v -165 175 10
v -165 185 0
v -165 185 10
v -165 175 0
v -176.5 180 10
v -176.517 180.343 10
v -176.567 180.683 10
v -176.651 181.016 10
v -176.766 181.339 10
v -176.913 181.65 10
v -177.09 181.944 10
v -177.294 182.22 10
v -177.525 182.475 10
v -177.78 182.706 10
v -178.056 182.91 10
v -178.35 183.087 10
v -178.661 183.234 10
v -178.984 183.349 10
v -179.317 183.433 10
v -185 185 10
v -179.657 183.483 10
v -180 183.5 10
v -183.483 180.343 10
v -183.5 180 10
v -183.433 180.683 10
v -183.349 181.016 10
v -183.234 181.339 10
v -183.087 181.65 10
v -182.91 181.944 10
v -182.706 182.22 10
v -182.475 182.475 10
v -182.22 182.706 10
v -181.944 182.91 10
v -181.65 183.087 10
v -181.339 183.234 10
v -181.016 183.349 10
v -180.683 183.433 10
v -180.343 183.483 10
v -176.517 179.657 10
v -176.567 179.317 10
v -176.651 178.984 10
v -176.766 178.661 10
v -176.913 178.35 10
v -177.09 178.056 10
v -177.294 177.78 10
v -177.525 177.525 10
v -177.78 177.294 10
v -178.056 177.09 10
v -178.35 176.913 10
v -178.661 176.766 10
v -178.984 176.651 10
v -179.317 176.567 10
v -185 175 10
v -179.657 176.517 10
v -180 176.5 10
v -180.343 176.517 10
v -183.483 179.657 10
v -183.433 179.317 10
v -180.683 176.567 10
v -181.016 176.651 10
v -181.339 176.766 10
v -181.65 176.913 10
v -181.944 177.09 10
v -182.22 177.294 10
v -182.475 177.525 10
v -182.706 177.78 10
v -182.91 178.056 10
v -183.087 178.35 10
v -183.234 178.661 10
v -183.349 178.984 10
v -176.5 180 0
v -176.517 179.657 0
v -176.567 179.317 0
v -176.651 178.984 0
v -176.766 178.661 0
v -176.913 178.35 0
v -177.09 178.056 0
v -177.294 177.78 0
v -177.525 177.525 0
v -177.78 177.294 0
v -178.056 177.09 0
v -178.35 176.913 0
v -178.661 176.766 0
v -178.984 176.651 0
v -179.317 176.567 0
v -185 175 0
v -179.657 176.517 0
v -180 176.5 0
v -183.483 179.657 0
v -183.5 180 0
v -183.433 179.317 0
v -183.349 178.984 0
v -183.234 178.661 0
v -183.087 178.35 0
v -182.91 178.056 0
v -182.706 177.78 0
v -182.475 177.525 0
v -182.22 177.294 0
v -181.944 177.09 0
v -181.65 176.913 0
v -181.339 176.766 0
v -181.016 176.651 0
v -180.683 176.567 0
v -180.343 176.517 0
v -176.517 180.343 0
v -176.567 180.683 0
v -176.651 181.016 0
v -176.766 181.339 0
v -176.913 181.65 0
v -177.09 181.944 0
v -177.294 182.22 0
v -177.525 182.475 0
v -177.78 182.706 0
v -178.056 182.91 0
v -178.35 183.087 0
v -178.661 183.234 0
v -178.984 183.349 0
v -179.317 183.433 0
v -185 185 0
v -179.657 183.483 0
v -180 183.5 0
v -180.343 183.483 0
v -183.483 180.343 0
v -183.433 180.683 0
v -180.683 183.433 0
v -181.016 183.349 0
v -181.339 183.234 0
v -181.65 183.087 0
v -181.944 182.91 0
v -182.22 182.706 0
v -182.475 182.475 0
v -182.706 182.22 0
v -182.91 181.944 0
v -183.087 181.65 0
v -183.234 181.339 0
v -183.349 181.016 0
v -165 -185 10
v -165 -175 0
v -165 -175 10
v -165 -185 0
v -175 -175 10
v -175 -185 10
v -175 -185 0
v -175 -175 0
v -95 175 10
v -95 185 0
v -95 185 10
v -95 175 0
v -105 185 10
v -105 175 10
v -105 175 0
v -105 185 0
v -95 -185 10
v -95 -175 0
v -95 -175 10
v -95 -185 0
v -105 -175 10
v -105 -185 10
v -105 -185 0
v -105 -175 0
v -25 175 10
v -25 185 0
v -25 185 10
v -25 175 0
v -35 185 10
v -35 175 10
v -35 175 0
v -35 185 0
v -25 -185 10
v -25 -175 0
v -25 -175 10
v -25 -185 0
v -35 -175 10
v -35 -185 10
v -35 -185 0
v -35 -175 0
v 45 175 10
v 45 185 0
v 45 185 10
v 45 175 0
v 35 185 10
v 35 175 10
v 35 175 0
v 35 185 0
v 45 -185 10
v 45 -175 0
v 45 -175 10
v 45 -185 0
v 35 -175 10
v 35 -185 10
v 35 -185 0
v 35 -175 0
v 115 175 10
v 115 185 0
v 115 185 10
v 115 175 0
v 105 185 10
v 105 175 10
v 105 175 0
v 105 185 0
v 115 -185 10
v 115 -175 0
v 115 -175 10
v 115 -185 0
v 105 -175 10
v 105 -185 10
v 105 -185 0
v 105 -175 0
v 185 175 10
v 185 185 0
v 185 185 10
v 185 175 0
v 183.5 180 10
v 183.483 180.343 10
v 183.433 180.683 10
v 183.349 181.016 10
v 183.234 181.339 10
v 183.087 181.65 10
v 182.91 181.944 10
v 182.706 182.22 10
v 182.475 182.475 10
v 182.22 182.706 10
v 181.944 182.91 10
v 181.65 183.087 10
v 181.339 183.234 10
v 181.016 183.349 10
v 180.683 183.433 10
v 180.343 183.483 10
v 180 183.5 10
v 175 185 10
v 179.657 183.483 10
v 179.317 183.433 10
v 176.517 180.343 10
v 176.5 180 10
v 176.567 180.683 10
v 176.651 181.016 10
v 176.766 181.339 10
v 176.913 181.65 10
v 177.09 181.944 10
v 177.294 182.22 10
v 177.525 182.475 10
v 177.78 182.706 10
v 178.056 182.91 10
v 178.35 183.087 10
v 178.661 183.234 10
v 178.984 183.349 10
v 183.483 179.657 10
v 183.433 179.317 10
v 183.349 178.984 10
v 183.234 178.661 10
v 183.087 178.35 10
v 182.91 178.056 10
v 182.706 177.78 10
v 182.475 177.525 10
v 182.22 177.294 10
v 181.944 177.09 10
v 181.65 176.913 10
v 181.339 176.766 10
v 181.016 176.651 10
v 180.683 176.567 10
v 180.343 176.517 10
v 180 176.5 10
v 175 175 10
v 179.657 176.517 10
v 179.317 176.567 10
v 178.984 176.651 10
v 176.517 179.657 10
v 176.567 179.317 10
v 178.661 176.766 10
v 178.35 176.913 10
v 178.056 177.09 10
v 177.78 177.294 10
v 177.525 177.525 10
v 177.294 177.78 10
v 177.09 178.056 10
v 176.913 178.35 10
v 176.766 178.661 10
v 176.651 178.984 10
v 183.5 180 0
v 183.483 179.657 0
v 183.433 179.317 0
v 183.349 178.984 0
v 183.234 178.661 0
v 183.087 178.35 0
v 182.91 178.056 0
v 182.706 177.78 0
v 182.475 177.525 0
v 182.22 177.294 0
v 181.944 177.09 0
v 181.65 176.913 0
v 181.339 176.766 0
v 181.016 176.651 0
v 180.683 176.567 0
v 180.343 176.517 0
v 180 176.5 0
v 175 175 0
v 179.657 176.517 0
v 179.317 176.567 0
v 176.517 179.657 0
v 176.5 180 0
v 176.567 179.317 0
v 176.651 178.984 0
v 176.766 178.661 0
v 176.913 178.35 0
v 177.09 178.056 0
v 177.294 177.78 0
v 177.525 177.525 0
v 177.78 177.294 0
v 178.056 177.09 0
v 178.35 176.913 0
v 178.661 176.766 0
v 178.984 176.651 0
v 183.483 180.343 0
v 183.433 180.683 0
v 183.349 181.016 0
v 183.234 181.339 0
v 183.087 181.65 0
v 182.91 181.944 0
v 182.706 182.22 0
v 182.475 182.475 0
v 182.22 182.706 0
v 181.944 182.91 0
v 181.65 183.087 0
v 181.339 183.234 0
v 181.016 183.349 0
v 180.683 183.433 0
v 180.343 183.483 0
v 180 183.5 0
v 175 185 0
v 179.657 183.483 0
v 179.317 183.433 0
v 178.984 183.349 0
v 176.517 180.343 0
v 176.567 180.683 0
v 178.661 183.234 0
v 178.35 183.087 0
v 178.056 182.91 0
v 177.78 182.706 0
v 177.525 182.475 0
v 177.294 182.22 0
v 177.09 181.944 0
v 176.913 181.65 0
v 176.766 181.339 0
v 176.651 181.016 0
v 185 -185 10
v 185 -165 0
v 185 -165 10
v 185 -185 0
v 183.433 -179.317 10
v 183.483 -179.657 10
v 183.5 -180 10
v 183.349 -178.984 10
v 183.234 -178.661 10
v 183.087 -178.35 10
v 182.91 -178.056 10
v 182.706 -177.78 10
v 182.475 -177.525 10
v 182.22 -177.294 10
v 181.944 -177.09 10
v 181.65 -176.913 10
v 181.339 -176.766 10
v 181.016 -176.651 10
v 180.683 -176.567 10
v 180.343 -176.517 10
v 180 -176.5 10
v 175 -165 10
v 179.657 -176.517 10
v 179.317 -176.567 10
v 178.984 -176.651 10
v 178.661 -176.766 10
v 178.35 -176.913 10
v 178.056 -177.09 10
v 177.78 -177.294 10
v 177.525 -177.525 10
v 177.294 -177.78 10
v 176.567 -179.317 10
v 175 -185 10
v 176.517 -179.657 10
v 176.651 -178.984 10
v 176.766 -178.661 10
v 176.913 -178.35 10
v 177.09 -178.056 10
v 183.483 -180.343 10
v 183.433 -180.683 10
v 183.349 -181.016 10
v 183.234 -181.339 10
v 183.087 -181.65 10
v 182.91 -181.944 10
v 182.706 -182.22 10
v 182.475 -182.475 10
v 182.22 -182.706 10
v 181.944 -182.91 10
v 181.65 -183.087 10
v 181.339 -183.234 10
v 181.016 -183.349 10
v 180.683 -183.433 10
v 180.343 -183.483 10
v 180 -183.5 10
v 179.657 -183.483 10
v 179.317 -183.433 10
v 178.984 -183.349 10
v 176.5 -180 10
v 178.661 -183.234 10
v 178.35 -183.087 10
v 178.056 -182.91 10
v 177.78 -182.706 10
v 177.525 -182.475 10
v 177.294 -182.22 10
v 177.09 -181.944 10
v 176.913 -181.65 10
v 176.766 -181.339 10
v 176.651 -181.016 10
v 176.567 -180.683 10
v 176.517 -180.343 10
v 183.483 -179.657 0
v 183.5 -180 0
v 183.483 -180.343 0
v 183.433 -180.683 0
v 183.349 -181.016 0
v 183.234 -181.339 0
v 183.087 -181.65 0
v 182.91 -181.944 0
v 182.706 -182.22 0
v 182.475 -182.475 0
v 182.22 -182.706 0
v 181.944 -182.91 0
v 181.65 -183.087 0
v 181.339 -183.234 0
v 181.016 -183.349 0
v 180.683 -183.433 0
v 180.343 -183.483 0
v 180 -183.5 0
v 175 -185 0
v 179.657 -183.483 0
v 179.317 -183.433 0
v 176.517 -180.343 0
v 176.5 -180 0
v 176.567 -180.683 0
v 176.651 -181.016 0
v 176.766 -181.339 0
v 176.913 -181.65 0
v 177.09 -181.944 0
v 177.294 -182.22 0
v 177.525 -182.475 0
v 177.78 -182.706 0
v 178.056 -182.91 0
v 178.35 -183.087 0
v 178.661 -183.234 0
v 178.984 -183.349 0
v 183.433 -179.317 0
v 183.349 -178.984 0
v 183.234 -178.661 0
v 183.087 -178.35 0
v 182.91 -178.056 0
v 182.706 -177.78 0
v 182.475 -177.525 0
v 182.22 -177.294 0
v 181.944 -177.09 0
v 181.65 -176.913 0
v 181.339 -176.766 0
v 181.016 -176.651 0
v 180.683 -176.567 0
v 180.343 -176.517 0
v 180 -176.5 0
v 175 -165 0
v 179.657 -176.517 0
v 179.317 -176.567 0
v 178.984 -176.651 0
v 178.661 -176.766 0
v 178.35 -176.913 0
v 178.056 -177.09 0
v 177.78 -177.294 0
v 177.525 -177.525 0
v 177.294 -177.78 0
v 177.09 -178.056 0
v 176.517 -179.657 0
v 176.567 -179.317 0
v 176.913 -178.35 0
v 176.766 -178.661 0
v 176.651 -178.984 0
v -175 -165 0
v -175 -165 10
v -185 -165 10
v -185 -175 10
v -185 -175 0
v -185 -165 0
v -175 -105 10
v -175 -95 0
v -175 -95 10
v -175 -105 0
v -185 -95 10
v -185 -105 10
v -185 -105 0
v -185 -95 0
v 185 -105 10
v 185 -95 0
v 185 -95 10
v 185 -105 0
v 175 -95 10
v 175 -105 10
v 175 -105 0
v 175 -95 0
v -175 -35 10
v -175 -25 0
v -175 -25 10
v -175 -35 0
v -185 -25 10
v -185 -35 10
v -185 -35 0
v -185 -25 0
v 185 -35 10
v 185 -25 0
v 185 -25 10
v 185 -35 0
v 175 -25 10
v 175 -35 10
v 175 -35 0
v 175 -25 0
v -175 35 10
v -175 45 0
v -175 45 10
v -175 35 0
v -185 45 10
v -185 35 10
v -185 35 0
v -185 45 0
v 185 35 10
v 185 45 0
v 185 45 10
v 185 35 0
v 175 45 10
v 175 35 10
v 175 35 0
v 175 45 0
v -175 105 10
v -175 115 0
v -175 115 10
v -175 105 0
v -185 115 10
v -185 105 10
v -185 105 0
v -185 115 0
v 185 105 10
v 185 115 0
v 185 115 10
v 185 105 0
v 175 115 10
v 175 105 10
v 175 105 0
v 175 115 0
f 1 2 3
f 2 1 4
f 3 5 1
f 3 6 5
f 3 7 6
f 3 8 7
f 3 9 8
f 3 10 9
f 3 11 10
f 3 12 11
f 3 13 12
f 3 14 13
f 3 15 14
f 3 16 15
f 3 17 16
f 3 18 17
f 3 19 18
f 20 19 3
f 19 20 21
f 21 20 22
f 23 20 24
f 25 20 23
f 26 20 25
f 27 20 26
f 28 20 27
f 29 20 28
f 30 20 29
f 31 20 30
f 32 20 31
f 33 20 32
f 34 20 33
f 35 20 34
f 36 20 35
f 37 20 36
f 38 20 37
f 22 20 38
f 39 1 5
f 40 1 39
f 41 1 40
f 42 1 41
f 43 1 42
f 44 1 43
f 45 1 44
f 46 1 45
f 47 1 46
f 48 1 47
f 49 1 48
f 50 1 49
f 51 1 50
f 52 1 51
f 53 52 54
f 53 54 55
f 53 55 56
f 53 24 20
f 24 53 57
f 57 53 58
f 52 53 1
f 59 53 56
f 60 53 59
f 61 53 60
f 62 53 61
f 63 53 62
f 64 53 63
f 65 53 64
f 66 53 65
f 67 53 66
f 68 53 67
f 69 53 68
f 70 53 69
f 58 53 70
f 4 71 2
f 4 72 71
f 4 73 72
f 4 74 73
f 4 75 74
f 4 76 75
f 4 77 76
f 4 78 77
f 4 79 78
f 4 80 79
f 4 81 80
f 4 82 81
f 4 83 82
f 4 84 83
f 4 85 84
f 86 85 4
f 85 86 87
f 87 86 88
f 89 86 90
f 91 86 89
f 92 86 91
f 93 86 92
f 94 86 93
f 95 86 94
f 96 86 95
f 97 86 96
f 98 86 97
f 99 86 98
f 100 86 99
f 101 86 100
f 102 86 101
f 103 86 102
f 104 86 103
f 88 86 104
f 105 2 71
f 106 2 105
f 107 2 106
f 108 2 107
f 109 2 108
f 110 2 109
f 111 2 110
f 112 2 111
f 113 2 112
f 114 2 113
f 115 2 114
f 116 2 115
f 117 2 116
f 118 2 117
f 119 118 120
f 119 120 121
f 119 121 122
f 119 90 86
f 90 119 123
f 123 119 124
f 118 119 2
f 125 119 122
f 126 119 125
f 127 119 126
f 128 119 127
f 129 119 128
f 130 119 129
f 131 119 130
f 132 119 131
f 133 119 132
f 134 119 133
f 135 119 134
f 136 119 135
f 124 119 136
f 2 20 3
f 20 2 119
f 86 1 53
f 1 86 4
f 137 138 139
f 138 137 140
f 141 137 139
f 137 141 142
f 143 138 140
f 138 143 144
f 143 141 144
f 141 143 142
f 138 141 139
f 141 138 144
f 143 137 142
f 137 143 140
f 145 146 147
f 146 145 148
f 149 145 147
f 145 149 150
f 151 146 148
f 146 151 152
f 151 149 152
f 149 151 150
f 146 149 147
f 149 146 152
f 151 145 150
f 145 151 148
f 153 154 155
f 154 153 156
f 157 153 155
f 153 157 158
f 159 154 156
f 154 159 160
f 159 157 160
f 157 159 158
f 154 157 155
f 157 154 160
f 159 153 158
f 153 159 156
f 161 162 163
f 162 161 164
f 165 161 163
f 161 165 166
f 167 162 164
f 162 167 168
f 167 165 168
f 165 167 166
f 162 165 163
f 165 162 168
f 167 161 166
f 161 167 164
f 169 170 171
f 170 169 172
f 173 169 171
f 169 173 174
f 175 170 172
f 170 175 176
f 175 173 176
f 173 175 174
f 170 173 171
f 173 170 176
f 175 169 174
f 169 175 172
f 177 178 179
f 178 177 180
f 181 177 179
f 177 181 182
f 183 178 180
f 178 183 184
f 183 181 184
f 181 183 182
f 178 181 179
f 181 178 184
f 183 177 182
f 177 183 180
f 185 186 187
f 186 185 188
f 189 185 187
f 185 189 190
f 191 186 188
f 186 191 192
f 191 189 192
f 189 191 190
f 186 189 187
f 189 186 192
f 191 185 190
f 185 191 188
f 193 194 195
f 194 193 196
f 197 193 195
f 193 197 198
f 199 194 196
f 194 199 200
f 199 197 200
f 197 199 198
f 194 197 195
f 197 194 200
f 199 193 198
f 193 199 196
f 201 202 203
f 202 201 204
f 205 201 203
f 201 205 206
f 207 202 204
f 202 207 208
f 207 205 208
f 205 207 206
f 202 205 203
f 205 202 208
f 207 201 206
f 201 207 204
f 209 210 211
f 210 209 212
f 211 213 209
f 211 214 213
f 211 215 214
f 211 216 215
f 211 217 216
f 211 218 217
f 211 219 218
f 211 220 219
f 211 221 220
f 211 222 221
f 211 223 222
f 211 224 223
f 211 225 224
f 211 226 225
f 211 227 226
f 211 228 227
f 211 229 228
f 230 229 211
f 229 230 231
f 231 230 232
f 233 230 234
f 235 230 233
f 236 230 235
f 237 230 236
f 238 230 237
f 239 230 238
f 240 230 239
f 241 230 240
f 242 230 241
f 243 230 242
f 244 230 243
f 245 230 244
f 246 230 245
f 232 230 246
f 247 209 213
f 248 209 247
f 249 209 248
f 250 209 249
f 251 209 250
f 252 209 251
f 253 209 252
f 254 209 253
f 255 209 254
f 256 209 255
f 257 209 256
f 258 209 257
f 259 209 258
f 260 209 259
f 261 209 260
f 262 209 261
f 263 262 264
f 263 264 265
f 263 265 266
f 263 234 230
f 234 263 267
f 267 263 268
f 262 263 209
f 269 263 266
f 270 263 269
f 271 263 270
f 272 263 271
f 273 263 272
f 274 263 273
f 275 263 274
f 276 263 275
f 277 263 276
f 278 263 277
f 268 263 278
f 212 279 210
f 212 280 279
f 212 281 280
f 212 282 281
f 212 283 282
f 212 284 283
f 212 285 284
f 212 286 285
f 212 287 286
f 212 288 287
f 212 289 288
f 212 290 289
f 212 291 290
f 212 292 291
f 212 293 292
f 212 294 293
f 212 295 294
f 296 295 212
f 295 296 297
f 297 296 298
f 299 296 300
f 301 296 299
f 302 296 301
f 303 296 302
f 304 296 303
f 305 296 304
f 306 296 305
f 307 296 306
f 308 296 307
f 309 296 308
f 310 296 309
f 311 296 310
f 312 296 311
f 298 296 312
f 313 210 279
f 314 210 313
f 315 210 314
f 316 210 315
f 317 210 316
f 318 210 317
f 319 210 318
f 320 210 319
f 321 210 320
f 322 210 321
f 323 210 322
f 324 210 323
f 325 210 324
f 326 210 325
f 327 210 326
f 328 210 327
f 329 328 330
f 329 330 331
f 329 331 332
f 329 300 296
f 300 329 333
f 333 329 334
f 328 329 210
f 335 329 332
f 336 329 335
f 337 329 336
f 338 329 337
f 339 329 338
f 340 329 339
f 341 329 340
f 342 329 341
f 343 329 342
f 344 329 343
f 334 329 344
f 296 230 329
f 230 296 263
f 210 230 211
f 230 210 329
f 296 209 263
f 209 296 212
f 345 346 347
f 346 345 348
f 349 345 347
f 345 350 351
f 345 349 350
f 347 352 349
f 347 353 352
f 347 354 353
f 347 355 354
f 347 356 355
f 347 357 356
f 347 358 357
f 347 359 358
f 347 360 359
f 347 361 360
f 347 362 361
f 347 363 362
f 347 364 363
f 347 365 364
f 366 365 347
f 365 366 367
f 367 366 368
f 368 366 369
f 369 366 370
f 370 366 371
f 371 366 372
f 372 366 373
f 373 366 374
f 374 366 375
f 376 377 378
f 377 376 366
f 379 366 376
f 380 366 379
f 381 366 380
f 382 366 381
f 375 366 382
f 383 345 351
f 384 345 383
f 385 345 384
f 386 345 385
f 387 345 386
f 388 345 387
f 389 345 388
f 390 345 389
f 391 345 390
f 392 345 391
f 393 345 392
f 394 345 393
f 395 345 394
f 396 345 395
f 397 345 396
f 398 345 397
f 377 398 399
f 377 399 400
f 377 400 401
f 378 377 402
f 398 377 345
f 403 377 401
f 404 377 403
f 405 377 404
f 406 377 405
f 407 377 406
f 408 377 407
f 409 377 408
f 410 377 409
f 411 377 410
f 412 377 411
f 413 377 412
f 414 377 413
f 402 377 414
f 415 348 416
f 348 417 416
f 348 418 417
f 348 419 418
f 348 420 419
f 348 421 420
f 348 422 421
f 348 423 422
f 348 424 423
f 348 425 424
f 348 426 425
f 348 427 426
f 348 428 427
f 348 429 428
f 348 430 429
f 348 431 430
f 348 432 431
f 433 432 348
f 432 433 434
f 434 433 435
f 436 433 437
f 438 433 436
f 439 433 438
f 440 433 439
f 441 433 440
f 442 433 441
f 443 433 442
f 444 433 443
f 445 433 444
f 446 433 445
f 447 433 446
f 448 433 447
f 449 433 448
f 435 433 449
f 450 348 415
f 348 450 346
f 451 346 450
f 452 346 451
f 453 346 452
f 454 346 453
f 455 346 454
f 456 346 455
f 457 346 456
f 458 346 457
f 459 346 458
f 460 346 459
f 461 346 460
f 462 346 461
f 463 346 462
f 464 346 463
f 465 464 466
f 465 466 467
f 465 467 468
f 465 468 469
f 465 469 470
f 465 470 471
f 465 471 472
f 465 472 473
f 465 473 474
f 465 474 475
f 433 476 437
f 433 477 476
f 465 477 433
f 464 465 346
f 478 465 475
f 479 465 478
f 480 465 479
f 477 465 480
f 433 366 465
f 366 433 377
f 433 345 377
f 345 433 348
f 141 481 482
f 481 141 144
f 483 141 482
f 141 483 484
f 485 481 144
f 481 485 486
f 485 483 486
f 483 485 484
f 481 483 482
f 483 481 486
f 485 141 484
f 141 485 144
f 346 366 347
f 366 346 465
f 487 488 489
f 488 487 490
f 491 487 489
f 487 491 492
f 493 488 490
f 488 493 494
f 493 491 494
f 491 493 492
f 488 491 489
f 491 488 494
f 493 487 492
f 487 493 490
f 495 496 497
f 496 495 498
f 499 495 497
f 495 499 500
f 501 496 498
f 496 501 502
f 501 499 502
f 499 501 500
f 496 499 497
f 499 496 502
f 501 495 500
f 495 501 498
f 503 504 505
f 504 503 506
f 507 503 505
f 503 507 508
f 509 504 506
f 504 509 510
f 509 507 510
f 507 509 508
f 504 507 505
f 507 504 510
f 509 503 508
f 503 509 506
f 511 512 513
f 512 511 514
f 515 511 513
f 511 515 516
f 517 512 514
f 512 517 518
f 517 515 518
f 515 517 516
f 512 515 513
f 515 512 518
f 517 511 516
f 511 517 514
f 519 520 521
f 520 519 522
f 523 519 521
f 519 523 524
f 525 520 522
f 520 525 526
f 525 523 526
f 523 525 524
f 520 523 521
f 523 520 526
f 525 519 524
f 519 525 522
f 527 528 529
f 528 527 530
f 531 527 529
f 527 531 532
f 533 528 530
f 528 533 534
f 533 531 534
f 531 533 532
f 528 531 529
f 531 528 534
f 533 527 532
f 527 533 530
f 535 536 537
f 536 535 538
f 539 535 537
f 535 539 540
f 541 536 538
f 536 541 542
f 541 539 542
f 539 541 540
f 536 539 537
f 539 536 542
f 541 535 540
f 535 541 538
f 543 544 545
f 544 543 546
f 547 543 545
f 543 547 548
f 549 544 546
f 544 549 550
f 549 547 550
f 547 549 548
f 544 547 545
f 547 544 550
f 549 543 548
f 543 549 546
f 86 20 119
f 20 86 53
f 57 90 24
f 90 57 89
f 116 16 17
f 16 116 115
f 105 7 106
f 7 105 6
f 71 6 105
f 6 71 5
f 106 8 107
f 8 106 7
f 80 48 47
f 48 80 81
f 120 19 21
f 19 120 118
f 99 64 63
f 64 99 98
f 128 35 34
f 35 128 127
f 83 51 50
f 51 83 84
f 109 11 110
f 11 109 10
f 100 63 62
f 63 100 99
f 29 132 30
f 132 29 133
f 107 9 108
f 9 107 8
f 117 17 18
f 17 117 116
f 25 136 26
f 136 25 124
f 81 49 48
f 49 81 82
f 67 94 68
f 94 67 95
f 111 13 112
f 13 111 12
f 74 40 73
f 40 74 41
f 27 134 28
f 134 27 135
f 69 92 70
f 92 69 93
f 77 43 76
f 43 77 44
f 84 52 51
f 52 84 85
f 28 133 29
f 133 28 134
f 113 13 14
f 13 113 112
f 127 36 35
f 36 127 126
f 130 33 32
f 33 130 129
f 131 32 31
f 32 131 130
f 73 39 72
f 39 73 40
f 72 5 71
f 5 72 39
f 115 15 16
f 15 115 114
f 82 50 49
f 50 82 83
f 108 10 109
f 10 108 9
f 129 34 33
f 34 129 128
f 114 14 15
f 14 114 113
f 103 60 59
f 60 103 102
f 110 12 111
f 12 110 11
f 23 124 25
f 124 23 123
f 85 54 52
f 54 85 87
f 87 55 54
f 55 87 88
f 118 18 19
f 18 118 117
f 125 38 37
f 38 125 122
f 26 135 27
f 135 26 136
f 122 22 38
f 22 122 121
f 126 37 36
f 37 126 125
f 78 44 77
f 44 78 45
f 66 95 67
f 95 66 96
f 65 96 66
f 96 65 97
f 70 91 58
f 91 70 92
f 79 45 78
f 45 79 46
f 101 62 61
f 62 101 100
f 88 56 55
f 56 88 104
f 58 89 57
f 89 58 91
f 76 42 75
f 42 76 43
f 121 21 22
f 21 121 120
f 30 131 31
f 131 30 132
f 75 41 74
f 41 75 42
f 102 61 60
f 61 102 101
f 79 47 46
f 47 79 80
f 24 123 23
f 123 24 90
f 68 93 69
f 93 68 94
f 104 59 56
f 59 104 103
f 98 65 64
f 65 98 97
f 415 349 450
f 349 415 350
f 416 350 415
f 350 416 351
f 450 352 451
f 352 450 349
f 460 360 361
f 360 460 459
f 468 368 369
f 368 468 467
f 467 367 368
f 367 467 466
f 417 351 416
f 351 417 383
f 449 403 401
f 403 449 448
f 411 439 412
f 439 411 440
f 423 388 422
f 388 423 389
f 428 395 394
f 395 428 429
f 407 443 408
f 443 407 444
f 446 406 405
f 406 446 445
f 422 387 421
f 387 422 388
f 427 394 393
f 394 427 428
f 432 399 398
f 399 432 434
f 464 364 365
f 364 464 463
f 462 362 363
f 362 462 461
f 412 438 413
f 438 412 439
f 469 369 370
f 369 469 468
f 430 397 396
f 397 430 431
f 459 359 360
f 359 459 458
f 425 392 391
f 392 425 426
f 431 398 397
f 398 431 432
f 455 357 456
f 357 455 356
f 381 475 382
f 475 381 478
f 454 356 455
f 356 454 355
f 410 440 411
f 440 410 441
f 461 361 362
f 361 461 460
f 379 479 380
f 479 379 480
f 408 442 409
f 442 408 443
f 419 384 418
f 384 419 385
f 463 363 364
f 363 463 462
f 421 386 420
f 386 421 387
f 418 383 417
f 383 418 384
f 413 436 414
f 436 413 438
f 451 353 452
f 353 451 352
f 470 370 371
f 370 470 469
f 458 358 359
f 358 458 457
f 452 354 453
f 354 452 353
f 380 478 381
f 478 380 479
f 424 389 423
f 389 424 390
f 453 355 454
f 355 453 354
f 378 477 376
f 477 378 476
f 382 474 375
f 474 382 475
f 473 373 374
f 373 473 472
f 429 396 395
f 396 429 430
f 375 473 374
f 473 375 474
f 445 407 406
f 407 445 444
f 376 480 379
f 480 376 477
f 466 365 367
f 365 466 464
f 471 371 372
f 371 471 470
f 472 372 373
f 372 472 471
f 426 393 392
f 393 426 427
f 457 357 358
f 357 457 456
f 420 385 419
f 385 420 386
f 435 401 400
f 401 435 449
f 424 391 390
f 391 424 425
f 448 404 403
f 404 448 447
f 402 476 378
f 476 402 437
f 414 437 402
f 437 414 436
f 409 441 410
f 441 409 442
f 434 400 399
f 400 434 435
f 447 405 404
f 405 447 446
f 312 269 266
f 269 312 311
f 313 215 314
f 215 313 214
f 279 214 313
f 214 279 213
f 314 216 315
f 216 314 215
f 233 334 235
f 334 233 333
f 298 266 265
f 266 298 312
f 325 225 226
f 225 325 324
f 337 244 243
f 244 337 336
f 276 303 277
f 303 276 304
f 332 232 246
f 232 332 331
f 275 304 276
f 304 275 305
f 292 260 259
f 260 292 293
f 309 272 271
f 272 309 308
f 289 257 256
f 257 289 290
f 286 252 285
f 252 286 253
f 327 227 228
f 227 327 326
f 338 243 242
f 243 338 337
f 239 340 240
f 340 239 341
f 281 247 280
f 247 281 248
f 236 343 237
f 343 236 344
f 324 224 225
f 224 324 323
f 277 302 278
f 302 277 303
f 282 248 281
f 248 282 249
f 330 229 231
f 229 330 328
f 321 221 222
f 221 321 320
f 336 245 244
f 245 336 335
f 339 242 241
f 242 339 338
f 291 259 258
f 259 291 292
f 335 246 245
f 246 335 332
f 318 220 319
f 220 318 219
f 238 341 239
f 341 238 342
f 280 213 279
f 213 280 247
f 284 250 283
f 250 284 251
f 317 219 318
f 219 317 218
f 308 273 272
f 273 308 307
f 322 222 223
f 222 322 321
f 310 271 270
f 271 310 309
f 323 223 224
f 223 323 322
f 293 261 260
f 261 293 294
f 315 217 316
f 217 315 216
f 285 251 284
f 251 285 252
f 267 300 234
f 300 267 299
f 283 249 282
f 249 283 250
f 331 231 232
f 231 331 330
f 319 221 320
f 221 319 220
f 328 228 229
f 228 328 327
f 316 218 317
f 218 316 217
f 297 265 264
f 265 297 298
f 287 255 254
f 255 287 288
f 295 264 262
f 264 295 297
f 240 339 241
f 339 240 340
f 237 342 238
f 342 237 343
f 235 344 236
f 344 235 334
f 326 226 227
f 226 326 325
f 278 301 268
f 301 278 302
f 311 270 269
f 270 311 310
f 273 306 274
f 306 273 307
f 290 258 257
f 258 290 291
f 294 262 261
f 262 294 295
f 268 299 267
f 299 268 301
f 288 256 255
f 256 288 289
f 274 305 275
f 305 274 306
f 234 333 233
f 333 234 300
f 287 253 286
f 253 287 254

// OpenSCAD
// ring_12.scad - ring index 12 (z bottom = 120 mm)
$fn = 64; bar = 10; half_b = bar/2; outer = 370; half_outer = outer/2;
front_y = 180; back_y = -180; left_x = -180; right_x = 180;
x_centers = [-170, -100, -30, 40, 110, 180];
z_centers = [5, 85, 155, 225, 295, 365, 435, 505, 575, 645, 715]; ring_z = 120;
module place_box(cx, cy, sx, sy) { translate([cx - sx/2, cy - sy/2, 0]) cube([sx, sy, bar]); }

difference() { union() {
    for (x = x_centers) { place_box(x, front_y, bar, bar); place_box(x, back_y, bar, bar); }
    for (y = x_centers) { place_box(left_x, y, bar, bar); place_box(right_x, y, bar, bar); }
    for (zc = z_centers) if ((zc - half_b < ring_z + bar) && (zc + half_b > ring_z)) {
        translate([-half_outer, front_y - half_b, 0]) cube([outer, bar, bar]);
        translate([-half_outer, back_y - half_b, 0])  cube([outer, bar, bar]);
        translate([left_x - half_b, -half_outer, 0])  cube([bar, outer, bar]);
        translate([right_x - half_b, -half_outer, 0]) cube([bar, outer, bar]);
    }
  }
  for (cx = [-180, 180]) for (cy = [-180, 180]) translate([cx, cy, 0]) cylinder(h = bar, r = 3.5, $fn = 64);
}
